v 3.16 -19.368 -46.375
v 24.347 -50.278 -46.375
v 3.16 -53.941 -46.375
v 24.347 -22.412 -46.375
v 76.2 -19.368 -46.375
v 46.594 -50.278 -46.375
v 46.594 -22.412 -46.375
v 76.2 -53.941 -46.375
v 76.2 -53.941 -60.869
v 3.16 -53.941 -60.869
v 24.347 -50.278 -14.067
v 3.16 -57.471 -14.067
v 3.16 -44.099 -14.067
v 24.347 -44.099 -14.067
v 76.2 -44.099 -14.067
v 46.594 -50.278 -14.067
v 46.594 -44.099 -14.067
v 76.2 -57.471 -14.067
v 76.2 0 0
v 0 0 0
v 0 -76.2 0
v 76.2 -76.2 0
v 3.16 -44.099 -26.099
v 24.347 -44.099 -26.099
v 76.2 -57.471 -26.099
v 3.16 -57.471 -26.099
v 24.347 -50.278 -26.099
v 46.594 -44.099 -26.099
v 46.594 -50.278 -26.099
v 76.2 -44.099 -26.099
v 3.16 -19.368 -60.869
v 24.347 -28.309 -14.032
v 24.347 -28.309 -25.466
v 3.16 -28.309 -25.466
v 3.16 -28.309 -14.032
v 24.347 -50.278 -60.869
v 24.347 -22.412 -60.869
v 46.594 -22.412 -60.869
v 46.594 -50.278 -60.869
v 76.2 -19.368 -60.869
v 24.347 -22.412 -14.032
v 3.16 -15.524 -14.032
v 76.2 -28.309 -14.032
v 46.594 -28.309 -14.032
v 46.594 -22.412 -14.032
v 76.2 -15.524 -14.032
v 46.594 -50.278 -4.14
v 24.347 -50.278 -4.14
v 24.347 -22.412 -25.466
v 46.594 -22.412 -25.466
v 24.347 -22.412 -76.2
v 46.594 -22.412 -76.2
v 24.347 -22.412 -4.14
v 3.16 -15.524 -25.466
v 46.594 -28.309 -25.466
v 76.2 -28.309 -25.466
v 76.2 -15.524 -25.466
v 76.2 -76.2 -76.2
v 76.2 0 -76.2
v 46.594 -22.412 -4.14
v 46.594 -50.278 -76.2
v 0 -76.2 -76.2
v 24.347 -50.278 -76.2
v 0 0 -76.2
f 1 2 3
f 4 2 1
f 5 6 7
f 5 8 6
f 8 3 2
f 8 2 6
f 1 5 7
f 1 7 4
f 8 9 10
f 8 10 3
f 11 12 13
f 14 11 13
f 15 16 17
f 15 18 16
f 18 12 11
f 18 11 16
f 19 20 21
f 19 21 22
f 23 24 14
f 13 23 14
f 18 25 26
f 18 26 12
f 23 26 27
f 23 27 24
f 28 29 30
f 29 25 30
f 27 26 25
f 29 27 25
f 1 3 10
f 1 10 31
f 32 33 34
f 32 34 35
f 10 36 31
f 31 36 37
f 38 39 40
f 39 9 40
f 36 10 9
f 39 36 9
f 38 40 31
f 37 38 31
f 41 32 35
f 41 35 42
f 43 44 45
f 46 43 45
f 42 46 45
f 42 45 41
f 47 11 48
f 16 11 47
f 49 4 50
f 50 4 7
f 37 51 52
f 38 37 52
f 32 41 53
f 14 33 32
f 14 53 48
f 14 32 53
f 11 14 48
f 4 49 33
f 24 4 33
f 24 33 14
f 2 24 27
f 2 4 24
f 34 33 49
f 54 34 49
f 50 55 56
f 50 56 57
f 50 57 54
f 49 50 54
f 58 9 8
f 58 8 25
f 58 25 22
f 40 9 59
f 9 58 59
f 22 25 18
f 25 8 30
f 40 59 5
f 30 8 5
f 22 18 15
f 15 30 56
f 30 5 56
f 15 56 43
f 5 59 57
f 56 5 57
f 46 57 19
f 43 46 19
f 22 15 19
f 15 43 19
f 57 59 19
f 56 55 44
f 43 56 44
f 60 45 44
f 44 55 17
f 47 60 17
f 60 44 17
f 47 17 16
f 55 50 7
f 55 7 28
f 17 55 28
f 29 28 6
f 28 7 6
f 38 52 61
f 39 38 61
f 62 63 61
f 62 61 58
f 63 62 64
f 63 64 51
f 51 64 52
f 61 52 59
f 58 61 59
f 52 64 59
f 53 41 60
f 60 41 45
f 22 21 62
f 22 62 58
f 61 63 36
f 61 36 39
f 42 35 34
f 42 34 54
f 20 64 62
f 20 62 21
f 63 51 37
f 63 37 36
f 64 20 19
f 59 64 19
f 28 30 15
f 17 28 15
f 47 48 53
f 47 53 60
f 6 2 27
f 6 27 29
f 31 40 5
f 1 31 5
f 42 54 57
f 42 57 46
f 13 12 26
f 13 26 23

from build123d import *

# Parameters (mm, degrees)
F0_W     = 76.2
F0_H     = 76.2
F1_DEPTH = 76.2
F2_W     = 12.78471
F2_H     = 11.434516
F2_W_2   = 13.372
F2_H_2   = 12.032146
F2_W_3   = 34.573561
F2_H_3   = 14.494572
F4_DEPTH = 73.040023
F3_W     = 22.247531
F3_H     = 27.866135
F5_DEPTH = 72.060369


with BuildPart() as f1:
    # F0 (on Front) → F1 (new body)
    with BuildSketch(Plane.XZ):
        with Locations((38.1, -38.1)):
            Rectangle(F0_W, F0_H)
    extrude(amount=F1_DEPTH)

    # F2 (on face) → F4 (cut)
    with BuildSketch(Plane.YZ.offset(76.2)):
        with Locations((-21.916236, -19.748955)):
            Rectangle(F2_W, F2_H)
        with Locations((-50.78535, -20.083058)):
            Rectangle(F2_W_2, F2_H_2)
        with Locations((-36.654551, -53.62192)):
            Rectangle(F2_W_3, F2_H_3)
    extrude(amount=-F4_DEPTH, mode=Mode.SUBTRACT)

    # F3 (on face) → F5 (cut)
    with BuildSketch(Plane(origin=(0, 0, -76.2), x_dir=(1, 0, 0), z_dir=(0, 0, -1))):
        with Locations((35.47072, 36.344724)):
            Rectangle(F3_W, F3_H)
    extrude(amount=-F5_DEPTH, mode=Mode.SUBTRACT)


solid = f1.part
